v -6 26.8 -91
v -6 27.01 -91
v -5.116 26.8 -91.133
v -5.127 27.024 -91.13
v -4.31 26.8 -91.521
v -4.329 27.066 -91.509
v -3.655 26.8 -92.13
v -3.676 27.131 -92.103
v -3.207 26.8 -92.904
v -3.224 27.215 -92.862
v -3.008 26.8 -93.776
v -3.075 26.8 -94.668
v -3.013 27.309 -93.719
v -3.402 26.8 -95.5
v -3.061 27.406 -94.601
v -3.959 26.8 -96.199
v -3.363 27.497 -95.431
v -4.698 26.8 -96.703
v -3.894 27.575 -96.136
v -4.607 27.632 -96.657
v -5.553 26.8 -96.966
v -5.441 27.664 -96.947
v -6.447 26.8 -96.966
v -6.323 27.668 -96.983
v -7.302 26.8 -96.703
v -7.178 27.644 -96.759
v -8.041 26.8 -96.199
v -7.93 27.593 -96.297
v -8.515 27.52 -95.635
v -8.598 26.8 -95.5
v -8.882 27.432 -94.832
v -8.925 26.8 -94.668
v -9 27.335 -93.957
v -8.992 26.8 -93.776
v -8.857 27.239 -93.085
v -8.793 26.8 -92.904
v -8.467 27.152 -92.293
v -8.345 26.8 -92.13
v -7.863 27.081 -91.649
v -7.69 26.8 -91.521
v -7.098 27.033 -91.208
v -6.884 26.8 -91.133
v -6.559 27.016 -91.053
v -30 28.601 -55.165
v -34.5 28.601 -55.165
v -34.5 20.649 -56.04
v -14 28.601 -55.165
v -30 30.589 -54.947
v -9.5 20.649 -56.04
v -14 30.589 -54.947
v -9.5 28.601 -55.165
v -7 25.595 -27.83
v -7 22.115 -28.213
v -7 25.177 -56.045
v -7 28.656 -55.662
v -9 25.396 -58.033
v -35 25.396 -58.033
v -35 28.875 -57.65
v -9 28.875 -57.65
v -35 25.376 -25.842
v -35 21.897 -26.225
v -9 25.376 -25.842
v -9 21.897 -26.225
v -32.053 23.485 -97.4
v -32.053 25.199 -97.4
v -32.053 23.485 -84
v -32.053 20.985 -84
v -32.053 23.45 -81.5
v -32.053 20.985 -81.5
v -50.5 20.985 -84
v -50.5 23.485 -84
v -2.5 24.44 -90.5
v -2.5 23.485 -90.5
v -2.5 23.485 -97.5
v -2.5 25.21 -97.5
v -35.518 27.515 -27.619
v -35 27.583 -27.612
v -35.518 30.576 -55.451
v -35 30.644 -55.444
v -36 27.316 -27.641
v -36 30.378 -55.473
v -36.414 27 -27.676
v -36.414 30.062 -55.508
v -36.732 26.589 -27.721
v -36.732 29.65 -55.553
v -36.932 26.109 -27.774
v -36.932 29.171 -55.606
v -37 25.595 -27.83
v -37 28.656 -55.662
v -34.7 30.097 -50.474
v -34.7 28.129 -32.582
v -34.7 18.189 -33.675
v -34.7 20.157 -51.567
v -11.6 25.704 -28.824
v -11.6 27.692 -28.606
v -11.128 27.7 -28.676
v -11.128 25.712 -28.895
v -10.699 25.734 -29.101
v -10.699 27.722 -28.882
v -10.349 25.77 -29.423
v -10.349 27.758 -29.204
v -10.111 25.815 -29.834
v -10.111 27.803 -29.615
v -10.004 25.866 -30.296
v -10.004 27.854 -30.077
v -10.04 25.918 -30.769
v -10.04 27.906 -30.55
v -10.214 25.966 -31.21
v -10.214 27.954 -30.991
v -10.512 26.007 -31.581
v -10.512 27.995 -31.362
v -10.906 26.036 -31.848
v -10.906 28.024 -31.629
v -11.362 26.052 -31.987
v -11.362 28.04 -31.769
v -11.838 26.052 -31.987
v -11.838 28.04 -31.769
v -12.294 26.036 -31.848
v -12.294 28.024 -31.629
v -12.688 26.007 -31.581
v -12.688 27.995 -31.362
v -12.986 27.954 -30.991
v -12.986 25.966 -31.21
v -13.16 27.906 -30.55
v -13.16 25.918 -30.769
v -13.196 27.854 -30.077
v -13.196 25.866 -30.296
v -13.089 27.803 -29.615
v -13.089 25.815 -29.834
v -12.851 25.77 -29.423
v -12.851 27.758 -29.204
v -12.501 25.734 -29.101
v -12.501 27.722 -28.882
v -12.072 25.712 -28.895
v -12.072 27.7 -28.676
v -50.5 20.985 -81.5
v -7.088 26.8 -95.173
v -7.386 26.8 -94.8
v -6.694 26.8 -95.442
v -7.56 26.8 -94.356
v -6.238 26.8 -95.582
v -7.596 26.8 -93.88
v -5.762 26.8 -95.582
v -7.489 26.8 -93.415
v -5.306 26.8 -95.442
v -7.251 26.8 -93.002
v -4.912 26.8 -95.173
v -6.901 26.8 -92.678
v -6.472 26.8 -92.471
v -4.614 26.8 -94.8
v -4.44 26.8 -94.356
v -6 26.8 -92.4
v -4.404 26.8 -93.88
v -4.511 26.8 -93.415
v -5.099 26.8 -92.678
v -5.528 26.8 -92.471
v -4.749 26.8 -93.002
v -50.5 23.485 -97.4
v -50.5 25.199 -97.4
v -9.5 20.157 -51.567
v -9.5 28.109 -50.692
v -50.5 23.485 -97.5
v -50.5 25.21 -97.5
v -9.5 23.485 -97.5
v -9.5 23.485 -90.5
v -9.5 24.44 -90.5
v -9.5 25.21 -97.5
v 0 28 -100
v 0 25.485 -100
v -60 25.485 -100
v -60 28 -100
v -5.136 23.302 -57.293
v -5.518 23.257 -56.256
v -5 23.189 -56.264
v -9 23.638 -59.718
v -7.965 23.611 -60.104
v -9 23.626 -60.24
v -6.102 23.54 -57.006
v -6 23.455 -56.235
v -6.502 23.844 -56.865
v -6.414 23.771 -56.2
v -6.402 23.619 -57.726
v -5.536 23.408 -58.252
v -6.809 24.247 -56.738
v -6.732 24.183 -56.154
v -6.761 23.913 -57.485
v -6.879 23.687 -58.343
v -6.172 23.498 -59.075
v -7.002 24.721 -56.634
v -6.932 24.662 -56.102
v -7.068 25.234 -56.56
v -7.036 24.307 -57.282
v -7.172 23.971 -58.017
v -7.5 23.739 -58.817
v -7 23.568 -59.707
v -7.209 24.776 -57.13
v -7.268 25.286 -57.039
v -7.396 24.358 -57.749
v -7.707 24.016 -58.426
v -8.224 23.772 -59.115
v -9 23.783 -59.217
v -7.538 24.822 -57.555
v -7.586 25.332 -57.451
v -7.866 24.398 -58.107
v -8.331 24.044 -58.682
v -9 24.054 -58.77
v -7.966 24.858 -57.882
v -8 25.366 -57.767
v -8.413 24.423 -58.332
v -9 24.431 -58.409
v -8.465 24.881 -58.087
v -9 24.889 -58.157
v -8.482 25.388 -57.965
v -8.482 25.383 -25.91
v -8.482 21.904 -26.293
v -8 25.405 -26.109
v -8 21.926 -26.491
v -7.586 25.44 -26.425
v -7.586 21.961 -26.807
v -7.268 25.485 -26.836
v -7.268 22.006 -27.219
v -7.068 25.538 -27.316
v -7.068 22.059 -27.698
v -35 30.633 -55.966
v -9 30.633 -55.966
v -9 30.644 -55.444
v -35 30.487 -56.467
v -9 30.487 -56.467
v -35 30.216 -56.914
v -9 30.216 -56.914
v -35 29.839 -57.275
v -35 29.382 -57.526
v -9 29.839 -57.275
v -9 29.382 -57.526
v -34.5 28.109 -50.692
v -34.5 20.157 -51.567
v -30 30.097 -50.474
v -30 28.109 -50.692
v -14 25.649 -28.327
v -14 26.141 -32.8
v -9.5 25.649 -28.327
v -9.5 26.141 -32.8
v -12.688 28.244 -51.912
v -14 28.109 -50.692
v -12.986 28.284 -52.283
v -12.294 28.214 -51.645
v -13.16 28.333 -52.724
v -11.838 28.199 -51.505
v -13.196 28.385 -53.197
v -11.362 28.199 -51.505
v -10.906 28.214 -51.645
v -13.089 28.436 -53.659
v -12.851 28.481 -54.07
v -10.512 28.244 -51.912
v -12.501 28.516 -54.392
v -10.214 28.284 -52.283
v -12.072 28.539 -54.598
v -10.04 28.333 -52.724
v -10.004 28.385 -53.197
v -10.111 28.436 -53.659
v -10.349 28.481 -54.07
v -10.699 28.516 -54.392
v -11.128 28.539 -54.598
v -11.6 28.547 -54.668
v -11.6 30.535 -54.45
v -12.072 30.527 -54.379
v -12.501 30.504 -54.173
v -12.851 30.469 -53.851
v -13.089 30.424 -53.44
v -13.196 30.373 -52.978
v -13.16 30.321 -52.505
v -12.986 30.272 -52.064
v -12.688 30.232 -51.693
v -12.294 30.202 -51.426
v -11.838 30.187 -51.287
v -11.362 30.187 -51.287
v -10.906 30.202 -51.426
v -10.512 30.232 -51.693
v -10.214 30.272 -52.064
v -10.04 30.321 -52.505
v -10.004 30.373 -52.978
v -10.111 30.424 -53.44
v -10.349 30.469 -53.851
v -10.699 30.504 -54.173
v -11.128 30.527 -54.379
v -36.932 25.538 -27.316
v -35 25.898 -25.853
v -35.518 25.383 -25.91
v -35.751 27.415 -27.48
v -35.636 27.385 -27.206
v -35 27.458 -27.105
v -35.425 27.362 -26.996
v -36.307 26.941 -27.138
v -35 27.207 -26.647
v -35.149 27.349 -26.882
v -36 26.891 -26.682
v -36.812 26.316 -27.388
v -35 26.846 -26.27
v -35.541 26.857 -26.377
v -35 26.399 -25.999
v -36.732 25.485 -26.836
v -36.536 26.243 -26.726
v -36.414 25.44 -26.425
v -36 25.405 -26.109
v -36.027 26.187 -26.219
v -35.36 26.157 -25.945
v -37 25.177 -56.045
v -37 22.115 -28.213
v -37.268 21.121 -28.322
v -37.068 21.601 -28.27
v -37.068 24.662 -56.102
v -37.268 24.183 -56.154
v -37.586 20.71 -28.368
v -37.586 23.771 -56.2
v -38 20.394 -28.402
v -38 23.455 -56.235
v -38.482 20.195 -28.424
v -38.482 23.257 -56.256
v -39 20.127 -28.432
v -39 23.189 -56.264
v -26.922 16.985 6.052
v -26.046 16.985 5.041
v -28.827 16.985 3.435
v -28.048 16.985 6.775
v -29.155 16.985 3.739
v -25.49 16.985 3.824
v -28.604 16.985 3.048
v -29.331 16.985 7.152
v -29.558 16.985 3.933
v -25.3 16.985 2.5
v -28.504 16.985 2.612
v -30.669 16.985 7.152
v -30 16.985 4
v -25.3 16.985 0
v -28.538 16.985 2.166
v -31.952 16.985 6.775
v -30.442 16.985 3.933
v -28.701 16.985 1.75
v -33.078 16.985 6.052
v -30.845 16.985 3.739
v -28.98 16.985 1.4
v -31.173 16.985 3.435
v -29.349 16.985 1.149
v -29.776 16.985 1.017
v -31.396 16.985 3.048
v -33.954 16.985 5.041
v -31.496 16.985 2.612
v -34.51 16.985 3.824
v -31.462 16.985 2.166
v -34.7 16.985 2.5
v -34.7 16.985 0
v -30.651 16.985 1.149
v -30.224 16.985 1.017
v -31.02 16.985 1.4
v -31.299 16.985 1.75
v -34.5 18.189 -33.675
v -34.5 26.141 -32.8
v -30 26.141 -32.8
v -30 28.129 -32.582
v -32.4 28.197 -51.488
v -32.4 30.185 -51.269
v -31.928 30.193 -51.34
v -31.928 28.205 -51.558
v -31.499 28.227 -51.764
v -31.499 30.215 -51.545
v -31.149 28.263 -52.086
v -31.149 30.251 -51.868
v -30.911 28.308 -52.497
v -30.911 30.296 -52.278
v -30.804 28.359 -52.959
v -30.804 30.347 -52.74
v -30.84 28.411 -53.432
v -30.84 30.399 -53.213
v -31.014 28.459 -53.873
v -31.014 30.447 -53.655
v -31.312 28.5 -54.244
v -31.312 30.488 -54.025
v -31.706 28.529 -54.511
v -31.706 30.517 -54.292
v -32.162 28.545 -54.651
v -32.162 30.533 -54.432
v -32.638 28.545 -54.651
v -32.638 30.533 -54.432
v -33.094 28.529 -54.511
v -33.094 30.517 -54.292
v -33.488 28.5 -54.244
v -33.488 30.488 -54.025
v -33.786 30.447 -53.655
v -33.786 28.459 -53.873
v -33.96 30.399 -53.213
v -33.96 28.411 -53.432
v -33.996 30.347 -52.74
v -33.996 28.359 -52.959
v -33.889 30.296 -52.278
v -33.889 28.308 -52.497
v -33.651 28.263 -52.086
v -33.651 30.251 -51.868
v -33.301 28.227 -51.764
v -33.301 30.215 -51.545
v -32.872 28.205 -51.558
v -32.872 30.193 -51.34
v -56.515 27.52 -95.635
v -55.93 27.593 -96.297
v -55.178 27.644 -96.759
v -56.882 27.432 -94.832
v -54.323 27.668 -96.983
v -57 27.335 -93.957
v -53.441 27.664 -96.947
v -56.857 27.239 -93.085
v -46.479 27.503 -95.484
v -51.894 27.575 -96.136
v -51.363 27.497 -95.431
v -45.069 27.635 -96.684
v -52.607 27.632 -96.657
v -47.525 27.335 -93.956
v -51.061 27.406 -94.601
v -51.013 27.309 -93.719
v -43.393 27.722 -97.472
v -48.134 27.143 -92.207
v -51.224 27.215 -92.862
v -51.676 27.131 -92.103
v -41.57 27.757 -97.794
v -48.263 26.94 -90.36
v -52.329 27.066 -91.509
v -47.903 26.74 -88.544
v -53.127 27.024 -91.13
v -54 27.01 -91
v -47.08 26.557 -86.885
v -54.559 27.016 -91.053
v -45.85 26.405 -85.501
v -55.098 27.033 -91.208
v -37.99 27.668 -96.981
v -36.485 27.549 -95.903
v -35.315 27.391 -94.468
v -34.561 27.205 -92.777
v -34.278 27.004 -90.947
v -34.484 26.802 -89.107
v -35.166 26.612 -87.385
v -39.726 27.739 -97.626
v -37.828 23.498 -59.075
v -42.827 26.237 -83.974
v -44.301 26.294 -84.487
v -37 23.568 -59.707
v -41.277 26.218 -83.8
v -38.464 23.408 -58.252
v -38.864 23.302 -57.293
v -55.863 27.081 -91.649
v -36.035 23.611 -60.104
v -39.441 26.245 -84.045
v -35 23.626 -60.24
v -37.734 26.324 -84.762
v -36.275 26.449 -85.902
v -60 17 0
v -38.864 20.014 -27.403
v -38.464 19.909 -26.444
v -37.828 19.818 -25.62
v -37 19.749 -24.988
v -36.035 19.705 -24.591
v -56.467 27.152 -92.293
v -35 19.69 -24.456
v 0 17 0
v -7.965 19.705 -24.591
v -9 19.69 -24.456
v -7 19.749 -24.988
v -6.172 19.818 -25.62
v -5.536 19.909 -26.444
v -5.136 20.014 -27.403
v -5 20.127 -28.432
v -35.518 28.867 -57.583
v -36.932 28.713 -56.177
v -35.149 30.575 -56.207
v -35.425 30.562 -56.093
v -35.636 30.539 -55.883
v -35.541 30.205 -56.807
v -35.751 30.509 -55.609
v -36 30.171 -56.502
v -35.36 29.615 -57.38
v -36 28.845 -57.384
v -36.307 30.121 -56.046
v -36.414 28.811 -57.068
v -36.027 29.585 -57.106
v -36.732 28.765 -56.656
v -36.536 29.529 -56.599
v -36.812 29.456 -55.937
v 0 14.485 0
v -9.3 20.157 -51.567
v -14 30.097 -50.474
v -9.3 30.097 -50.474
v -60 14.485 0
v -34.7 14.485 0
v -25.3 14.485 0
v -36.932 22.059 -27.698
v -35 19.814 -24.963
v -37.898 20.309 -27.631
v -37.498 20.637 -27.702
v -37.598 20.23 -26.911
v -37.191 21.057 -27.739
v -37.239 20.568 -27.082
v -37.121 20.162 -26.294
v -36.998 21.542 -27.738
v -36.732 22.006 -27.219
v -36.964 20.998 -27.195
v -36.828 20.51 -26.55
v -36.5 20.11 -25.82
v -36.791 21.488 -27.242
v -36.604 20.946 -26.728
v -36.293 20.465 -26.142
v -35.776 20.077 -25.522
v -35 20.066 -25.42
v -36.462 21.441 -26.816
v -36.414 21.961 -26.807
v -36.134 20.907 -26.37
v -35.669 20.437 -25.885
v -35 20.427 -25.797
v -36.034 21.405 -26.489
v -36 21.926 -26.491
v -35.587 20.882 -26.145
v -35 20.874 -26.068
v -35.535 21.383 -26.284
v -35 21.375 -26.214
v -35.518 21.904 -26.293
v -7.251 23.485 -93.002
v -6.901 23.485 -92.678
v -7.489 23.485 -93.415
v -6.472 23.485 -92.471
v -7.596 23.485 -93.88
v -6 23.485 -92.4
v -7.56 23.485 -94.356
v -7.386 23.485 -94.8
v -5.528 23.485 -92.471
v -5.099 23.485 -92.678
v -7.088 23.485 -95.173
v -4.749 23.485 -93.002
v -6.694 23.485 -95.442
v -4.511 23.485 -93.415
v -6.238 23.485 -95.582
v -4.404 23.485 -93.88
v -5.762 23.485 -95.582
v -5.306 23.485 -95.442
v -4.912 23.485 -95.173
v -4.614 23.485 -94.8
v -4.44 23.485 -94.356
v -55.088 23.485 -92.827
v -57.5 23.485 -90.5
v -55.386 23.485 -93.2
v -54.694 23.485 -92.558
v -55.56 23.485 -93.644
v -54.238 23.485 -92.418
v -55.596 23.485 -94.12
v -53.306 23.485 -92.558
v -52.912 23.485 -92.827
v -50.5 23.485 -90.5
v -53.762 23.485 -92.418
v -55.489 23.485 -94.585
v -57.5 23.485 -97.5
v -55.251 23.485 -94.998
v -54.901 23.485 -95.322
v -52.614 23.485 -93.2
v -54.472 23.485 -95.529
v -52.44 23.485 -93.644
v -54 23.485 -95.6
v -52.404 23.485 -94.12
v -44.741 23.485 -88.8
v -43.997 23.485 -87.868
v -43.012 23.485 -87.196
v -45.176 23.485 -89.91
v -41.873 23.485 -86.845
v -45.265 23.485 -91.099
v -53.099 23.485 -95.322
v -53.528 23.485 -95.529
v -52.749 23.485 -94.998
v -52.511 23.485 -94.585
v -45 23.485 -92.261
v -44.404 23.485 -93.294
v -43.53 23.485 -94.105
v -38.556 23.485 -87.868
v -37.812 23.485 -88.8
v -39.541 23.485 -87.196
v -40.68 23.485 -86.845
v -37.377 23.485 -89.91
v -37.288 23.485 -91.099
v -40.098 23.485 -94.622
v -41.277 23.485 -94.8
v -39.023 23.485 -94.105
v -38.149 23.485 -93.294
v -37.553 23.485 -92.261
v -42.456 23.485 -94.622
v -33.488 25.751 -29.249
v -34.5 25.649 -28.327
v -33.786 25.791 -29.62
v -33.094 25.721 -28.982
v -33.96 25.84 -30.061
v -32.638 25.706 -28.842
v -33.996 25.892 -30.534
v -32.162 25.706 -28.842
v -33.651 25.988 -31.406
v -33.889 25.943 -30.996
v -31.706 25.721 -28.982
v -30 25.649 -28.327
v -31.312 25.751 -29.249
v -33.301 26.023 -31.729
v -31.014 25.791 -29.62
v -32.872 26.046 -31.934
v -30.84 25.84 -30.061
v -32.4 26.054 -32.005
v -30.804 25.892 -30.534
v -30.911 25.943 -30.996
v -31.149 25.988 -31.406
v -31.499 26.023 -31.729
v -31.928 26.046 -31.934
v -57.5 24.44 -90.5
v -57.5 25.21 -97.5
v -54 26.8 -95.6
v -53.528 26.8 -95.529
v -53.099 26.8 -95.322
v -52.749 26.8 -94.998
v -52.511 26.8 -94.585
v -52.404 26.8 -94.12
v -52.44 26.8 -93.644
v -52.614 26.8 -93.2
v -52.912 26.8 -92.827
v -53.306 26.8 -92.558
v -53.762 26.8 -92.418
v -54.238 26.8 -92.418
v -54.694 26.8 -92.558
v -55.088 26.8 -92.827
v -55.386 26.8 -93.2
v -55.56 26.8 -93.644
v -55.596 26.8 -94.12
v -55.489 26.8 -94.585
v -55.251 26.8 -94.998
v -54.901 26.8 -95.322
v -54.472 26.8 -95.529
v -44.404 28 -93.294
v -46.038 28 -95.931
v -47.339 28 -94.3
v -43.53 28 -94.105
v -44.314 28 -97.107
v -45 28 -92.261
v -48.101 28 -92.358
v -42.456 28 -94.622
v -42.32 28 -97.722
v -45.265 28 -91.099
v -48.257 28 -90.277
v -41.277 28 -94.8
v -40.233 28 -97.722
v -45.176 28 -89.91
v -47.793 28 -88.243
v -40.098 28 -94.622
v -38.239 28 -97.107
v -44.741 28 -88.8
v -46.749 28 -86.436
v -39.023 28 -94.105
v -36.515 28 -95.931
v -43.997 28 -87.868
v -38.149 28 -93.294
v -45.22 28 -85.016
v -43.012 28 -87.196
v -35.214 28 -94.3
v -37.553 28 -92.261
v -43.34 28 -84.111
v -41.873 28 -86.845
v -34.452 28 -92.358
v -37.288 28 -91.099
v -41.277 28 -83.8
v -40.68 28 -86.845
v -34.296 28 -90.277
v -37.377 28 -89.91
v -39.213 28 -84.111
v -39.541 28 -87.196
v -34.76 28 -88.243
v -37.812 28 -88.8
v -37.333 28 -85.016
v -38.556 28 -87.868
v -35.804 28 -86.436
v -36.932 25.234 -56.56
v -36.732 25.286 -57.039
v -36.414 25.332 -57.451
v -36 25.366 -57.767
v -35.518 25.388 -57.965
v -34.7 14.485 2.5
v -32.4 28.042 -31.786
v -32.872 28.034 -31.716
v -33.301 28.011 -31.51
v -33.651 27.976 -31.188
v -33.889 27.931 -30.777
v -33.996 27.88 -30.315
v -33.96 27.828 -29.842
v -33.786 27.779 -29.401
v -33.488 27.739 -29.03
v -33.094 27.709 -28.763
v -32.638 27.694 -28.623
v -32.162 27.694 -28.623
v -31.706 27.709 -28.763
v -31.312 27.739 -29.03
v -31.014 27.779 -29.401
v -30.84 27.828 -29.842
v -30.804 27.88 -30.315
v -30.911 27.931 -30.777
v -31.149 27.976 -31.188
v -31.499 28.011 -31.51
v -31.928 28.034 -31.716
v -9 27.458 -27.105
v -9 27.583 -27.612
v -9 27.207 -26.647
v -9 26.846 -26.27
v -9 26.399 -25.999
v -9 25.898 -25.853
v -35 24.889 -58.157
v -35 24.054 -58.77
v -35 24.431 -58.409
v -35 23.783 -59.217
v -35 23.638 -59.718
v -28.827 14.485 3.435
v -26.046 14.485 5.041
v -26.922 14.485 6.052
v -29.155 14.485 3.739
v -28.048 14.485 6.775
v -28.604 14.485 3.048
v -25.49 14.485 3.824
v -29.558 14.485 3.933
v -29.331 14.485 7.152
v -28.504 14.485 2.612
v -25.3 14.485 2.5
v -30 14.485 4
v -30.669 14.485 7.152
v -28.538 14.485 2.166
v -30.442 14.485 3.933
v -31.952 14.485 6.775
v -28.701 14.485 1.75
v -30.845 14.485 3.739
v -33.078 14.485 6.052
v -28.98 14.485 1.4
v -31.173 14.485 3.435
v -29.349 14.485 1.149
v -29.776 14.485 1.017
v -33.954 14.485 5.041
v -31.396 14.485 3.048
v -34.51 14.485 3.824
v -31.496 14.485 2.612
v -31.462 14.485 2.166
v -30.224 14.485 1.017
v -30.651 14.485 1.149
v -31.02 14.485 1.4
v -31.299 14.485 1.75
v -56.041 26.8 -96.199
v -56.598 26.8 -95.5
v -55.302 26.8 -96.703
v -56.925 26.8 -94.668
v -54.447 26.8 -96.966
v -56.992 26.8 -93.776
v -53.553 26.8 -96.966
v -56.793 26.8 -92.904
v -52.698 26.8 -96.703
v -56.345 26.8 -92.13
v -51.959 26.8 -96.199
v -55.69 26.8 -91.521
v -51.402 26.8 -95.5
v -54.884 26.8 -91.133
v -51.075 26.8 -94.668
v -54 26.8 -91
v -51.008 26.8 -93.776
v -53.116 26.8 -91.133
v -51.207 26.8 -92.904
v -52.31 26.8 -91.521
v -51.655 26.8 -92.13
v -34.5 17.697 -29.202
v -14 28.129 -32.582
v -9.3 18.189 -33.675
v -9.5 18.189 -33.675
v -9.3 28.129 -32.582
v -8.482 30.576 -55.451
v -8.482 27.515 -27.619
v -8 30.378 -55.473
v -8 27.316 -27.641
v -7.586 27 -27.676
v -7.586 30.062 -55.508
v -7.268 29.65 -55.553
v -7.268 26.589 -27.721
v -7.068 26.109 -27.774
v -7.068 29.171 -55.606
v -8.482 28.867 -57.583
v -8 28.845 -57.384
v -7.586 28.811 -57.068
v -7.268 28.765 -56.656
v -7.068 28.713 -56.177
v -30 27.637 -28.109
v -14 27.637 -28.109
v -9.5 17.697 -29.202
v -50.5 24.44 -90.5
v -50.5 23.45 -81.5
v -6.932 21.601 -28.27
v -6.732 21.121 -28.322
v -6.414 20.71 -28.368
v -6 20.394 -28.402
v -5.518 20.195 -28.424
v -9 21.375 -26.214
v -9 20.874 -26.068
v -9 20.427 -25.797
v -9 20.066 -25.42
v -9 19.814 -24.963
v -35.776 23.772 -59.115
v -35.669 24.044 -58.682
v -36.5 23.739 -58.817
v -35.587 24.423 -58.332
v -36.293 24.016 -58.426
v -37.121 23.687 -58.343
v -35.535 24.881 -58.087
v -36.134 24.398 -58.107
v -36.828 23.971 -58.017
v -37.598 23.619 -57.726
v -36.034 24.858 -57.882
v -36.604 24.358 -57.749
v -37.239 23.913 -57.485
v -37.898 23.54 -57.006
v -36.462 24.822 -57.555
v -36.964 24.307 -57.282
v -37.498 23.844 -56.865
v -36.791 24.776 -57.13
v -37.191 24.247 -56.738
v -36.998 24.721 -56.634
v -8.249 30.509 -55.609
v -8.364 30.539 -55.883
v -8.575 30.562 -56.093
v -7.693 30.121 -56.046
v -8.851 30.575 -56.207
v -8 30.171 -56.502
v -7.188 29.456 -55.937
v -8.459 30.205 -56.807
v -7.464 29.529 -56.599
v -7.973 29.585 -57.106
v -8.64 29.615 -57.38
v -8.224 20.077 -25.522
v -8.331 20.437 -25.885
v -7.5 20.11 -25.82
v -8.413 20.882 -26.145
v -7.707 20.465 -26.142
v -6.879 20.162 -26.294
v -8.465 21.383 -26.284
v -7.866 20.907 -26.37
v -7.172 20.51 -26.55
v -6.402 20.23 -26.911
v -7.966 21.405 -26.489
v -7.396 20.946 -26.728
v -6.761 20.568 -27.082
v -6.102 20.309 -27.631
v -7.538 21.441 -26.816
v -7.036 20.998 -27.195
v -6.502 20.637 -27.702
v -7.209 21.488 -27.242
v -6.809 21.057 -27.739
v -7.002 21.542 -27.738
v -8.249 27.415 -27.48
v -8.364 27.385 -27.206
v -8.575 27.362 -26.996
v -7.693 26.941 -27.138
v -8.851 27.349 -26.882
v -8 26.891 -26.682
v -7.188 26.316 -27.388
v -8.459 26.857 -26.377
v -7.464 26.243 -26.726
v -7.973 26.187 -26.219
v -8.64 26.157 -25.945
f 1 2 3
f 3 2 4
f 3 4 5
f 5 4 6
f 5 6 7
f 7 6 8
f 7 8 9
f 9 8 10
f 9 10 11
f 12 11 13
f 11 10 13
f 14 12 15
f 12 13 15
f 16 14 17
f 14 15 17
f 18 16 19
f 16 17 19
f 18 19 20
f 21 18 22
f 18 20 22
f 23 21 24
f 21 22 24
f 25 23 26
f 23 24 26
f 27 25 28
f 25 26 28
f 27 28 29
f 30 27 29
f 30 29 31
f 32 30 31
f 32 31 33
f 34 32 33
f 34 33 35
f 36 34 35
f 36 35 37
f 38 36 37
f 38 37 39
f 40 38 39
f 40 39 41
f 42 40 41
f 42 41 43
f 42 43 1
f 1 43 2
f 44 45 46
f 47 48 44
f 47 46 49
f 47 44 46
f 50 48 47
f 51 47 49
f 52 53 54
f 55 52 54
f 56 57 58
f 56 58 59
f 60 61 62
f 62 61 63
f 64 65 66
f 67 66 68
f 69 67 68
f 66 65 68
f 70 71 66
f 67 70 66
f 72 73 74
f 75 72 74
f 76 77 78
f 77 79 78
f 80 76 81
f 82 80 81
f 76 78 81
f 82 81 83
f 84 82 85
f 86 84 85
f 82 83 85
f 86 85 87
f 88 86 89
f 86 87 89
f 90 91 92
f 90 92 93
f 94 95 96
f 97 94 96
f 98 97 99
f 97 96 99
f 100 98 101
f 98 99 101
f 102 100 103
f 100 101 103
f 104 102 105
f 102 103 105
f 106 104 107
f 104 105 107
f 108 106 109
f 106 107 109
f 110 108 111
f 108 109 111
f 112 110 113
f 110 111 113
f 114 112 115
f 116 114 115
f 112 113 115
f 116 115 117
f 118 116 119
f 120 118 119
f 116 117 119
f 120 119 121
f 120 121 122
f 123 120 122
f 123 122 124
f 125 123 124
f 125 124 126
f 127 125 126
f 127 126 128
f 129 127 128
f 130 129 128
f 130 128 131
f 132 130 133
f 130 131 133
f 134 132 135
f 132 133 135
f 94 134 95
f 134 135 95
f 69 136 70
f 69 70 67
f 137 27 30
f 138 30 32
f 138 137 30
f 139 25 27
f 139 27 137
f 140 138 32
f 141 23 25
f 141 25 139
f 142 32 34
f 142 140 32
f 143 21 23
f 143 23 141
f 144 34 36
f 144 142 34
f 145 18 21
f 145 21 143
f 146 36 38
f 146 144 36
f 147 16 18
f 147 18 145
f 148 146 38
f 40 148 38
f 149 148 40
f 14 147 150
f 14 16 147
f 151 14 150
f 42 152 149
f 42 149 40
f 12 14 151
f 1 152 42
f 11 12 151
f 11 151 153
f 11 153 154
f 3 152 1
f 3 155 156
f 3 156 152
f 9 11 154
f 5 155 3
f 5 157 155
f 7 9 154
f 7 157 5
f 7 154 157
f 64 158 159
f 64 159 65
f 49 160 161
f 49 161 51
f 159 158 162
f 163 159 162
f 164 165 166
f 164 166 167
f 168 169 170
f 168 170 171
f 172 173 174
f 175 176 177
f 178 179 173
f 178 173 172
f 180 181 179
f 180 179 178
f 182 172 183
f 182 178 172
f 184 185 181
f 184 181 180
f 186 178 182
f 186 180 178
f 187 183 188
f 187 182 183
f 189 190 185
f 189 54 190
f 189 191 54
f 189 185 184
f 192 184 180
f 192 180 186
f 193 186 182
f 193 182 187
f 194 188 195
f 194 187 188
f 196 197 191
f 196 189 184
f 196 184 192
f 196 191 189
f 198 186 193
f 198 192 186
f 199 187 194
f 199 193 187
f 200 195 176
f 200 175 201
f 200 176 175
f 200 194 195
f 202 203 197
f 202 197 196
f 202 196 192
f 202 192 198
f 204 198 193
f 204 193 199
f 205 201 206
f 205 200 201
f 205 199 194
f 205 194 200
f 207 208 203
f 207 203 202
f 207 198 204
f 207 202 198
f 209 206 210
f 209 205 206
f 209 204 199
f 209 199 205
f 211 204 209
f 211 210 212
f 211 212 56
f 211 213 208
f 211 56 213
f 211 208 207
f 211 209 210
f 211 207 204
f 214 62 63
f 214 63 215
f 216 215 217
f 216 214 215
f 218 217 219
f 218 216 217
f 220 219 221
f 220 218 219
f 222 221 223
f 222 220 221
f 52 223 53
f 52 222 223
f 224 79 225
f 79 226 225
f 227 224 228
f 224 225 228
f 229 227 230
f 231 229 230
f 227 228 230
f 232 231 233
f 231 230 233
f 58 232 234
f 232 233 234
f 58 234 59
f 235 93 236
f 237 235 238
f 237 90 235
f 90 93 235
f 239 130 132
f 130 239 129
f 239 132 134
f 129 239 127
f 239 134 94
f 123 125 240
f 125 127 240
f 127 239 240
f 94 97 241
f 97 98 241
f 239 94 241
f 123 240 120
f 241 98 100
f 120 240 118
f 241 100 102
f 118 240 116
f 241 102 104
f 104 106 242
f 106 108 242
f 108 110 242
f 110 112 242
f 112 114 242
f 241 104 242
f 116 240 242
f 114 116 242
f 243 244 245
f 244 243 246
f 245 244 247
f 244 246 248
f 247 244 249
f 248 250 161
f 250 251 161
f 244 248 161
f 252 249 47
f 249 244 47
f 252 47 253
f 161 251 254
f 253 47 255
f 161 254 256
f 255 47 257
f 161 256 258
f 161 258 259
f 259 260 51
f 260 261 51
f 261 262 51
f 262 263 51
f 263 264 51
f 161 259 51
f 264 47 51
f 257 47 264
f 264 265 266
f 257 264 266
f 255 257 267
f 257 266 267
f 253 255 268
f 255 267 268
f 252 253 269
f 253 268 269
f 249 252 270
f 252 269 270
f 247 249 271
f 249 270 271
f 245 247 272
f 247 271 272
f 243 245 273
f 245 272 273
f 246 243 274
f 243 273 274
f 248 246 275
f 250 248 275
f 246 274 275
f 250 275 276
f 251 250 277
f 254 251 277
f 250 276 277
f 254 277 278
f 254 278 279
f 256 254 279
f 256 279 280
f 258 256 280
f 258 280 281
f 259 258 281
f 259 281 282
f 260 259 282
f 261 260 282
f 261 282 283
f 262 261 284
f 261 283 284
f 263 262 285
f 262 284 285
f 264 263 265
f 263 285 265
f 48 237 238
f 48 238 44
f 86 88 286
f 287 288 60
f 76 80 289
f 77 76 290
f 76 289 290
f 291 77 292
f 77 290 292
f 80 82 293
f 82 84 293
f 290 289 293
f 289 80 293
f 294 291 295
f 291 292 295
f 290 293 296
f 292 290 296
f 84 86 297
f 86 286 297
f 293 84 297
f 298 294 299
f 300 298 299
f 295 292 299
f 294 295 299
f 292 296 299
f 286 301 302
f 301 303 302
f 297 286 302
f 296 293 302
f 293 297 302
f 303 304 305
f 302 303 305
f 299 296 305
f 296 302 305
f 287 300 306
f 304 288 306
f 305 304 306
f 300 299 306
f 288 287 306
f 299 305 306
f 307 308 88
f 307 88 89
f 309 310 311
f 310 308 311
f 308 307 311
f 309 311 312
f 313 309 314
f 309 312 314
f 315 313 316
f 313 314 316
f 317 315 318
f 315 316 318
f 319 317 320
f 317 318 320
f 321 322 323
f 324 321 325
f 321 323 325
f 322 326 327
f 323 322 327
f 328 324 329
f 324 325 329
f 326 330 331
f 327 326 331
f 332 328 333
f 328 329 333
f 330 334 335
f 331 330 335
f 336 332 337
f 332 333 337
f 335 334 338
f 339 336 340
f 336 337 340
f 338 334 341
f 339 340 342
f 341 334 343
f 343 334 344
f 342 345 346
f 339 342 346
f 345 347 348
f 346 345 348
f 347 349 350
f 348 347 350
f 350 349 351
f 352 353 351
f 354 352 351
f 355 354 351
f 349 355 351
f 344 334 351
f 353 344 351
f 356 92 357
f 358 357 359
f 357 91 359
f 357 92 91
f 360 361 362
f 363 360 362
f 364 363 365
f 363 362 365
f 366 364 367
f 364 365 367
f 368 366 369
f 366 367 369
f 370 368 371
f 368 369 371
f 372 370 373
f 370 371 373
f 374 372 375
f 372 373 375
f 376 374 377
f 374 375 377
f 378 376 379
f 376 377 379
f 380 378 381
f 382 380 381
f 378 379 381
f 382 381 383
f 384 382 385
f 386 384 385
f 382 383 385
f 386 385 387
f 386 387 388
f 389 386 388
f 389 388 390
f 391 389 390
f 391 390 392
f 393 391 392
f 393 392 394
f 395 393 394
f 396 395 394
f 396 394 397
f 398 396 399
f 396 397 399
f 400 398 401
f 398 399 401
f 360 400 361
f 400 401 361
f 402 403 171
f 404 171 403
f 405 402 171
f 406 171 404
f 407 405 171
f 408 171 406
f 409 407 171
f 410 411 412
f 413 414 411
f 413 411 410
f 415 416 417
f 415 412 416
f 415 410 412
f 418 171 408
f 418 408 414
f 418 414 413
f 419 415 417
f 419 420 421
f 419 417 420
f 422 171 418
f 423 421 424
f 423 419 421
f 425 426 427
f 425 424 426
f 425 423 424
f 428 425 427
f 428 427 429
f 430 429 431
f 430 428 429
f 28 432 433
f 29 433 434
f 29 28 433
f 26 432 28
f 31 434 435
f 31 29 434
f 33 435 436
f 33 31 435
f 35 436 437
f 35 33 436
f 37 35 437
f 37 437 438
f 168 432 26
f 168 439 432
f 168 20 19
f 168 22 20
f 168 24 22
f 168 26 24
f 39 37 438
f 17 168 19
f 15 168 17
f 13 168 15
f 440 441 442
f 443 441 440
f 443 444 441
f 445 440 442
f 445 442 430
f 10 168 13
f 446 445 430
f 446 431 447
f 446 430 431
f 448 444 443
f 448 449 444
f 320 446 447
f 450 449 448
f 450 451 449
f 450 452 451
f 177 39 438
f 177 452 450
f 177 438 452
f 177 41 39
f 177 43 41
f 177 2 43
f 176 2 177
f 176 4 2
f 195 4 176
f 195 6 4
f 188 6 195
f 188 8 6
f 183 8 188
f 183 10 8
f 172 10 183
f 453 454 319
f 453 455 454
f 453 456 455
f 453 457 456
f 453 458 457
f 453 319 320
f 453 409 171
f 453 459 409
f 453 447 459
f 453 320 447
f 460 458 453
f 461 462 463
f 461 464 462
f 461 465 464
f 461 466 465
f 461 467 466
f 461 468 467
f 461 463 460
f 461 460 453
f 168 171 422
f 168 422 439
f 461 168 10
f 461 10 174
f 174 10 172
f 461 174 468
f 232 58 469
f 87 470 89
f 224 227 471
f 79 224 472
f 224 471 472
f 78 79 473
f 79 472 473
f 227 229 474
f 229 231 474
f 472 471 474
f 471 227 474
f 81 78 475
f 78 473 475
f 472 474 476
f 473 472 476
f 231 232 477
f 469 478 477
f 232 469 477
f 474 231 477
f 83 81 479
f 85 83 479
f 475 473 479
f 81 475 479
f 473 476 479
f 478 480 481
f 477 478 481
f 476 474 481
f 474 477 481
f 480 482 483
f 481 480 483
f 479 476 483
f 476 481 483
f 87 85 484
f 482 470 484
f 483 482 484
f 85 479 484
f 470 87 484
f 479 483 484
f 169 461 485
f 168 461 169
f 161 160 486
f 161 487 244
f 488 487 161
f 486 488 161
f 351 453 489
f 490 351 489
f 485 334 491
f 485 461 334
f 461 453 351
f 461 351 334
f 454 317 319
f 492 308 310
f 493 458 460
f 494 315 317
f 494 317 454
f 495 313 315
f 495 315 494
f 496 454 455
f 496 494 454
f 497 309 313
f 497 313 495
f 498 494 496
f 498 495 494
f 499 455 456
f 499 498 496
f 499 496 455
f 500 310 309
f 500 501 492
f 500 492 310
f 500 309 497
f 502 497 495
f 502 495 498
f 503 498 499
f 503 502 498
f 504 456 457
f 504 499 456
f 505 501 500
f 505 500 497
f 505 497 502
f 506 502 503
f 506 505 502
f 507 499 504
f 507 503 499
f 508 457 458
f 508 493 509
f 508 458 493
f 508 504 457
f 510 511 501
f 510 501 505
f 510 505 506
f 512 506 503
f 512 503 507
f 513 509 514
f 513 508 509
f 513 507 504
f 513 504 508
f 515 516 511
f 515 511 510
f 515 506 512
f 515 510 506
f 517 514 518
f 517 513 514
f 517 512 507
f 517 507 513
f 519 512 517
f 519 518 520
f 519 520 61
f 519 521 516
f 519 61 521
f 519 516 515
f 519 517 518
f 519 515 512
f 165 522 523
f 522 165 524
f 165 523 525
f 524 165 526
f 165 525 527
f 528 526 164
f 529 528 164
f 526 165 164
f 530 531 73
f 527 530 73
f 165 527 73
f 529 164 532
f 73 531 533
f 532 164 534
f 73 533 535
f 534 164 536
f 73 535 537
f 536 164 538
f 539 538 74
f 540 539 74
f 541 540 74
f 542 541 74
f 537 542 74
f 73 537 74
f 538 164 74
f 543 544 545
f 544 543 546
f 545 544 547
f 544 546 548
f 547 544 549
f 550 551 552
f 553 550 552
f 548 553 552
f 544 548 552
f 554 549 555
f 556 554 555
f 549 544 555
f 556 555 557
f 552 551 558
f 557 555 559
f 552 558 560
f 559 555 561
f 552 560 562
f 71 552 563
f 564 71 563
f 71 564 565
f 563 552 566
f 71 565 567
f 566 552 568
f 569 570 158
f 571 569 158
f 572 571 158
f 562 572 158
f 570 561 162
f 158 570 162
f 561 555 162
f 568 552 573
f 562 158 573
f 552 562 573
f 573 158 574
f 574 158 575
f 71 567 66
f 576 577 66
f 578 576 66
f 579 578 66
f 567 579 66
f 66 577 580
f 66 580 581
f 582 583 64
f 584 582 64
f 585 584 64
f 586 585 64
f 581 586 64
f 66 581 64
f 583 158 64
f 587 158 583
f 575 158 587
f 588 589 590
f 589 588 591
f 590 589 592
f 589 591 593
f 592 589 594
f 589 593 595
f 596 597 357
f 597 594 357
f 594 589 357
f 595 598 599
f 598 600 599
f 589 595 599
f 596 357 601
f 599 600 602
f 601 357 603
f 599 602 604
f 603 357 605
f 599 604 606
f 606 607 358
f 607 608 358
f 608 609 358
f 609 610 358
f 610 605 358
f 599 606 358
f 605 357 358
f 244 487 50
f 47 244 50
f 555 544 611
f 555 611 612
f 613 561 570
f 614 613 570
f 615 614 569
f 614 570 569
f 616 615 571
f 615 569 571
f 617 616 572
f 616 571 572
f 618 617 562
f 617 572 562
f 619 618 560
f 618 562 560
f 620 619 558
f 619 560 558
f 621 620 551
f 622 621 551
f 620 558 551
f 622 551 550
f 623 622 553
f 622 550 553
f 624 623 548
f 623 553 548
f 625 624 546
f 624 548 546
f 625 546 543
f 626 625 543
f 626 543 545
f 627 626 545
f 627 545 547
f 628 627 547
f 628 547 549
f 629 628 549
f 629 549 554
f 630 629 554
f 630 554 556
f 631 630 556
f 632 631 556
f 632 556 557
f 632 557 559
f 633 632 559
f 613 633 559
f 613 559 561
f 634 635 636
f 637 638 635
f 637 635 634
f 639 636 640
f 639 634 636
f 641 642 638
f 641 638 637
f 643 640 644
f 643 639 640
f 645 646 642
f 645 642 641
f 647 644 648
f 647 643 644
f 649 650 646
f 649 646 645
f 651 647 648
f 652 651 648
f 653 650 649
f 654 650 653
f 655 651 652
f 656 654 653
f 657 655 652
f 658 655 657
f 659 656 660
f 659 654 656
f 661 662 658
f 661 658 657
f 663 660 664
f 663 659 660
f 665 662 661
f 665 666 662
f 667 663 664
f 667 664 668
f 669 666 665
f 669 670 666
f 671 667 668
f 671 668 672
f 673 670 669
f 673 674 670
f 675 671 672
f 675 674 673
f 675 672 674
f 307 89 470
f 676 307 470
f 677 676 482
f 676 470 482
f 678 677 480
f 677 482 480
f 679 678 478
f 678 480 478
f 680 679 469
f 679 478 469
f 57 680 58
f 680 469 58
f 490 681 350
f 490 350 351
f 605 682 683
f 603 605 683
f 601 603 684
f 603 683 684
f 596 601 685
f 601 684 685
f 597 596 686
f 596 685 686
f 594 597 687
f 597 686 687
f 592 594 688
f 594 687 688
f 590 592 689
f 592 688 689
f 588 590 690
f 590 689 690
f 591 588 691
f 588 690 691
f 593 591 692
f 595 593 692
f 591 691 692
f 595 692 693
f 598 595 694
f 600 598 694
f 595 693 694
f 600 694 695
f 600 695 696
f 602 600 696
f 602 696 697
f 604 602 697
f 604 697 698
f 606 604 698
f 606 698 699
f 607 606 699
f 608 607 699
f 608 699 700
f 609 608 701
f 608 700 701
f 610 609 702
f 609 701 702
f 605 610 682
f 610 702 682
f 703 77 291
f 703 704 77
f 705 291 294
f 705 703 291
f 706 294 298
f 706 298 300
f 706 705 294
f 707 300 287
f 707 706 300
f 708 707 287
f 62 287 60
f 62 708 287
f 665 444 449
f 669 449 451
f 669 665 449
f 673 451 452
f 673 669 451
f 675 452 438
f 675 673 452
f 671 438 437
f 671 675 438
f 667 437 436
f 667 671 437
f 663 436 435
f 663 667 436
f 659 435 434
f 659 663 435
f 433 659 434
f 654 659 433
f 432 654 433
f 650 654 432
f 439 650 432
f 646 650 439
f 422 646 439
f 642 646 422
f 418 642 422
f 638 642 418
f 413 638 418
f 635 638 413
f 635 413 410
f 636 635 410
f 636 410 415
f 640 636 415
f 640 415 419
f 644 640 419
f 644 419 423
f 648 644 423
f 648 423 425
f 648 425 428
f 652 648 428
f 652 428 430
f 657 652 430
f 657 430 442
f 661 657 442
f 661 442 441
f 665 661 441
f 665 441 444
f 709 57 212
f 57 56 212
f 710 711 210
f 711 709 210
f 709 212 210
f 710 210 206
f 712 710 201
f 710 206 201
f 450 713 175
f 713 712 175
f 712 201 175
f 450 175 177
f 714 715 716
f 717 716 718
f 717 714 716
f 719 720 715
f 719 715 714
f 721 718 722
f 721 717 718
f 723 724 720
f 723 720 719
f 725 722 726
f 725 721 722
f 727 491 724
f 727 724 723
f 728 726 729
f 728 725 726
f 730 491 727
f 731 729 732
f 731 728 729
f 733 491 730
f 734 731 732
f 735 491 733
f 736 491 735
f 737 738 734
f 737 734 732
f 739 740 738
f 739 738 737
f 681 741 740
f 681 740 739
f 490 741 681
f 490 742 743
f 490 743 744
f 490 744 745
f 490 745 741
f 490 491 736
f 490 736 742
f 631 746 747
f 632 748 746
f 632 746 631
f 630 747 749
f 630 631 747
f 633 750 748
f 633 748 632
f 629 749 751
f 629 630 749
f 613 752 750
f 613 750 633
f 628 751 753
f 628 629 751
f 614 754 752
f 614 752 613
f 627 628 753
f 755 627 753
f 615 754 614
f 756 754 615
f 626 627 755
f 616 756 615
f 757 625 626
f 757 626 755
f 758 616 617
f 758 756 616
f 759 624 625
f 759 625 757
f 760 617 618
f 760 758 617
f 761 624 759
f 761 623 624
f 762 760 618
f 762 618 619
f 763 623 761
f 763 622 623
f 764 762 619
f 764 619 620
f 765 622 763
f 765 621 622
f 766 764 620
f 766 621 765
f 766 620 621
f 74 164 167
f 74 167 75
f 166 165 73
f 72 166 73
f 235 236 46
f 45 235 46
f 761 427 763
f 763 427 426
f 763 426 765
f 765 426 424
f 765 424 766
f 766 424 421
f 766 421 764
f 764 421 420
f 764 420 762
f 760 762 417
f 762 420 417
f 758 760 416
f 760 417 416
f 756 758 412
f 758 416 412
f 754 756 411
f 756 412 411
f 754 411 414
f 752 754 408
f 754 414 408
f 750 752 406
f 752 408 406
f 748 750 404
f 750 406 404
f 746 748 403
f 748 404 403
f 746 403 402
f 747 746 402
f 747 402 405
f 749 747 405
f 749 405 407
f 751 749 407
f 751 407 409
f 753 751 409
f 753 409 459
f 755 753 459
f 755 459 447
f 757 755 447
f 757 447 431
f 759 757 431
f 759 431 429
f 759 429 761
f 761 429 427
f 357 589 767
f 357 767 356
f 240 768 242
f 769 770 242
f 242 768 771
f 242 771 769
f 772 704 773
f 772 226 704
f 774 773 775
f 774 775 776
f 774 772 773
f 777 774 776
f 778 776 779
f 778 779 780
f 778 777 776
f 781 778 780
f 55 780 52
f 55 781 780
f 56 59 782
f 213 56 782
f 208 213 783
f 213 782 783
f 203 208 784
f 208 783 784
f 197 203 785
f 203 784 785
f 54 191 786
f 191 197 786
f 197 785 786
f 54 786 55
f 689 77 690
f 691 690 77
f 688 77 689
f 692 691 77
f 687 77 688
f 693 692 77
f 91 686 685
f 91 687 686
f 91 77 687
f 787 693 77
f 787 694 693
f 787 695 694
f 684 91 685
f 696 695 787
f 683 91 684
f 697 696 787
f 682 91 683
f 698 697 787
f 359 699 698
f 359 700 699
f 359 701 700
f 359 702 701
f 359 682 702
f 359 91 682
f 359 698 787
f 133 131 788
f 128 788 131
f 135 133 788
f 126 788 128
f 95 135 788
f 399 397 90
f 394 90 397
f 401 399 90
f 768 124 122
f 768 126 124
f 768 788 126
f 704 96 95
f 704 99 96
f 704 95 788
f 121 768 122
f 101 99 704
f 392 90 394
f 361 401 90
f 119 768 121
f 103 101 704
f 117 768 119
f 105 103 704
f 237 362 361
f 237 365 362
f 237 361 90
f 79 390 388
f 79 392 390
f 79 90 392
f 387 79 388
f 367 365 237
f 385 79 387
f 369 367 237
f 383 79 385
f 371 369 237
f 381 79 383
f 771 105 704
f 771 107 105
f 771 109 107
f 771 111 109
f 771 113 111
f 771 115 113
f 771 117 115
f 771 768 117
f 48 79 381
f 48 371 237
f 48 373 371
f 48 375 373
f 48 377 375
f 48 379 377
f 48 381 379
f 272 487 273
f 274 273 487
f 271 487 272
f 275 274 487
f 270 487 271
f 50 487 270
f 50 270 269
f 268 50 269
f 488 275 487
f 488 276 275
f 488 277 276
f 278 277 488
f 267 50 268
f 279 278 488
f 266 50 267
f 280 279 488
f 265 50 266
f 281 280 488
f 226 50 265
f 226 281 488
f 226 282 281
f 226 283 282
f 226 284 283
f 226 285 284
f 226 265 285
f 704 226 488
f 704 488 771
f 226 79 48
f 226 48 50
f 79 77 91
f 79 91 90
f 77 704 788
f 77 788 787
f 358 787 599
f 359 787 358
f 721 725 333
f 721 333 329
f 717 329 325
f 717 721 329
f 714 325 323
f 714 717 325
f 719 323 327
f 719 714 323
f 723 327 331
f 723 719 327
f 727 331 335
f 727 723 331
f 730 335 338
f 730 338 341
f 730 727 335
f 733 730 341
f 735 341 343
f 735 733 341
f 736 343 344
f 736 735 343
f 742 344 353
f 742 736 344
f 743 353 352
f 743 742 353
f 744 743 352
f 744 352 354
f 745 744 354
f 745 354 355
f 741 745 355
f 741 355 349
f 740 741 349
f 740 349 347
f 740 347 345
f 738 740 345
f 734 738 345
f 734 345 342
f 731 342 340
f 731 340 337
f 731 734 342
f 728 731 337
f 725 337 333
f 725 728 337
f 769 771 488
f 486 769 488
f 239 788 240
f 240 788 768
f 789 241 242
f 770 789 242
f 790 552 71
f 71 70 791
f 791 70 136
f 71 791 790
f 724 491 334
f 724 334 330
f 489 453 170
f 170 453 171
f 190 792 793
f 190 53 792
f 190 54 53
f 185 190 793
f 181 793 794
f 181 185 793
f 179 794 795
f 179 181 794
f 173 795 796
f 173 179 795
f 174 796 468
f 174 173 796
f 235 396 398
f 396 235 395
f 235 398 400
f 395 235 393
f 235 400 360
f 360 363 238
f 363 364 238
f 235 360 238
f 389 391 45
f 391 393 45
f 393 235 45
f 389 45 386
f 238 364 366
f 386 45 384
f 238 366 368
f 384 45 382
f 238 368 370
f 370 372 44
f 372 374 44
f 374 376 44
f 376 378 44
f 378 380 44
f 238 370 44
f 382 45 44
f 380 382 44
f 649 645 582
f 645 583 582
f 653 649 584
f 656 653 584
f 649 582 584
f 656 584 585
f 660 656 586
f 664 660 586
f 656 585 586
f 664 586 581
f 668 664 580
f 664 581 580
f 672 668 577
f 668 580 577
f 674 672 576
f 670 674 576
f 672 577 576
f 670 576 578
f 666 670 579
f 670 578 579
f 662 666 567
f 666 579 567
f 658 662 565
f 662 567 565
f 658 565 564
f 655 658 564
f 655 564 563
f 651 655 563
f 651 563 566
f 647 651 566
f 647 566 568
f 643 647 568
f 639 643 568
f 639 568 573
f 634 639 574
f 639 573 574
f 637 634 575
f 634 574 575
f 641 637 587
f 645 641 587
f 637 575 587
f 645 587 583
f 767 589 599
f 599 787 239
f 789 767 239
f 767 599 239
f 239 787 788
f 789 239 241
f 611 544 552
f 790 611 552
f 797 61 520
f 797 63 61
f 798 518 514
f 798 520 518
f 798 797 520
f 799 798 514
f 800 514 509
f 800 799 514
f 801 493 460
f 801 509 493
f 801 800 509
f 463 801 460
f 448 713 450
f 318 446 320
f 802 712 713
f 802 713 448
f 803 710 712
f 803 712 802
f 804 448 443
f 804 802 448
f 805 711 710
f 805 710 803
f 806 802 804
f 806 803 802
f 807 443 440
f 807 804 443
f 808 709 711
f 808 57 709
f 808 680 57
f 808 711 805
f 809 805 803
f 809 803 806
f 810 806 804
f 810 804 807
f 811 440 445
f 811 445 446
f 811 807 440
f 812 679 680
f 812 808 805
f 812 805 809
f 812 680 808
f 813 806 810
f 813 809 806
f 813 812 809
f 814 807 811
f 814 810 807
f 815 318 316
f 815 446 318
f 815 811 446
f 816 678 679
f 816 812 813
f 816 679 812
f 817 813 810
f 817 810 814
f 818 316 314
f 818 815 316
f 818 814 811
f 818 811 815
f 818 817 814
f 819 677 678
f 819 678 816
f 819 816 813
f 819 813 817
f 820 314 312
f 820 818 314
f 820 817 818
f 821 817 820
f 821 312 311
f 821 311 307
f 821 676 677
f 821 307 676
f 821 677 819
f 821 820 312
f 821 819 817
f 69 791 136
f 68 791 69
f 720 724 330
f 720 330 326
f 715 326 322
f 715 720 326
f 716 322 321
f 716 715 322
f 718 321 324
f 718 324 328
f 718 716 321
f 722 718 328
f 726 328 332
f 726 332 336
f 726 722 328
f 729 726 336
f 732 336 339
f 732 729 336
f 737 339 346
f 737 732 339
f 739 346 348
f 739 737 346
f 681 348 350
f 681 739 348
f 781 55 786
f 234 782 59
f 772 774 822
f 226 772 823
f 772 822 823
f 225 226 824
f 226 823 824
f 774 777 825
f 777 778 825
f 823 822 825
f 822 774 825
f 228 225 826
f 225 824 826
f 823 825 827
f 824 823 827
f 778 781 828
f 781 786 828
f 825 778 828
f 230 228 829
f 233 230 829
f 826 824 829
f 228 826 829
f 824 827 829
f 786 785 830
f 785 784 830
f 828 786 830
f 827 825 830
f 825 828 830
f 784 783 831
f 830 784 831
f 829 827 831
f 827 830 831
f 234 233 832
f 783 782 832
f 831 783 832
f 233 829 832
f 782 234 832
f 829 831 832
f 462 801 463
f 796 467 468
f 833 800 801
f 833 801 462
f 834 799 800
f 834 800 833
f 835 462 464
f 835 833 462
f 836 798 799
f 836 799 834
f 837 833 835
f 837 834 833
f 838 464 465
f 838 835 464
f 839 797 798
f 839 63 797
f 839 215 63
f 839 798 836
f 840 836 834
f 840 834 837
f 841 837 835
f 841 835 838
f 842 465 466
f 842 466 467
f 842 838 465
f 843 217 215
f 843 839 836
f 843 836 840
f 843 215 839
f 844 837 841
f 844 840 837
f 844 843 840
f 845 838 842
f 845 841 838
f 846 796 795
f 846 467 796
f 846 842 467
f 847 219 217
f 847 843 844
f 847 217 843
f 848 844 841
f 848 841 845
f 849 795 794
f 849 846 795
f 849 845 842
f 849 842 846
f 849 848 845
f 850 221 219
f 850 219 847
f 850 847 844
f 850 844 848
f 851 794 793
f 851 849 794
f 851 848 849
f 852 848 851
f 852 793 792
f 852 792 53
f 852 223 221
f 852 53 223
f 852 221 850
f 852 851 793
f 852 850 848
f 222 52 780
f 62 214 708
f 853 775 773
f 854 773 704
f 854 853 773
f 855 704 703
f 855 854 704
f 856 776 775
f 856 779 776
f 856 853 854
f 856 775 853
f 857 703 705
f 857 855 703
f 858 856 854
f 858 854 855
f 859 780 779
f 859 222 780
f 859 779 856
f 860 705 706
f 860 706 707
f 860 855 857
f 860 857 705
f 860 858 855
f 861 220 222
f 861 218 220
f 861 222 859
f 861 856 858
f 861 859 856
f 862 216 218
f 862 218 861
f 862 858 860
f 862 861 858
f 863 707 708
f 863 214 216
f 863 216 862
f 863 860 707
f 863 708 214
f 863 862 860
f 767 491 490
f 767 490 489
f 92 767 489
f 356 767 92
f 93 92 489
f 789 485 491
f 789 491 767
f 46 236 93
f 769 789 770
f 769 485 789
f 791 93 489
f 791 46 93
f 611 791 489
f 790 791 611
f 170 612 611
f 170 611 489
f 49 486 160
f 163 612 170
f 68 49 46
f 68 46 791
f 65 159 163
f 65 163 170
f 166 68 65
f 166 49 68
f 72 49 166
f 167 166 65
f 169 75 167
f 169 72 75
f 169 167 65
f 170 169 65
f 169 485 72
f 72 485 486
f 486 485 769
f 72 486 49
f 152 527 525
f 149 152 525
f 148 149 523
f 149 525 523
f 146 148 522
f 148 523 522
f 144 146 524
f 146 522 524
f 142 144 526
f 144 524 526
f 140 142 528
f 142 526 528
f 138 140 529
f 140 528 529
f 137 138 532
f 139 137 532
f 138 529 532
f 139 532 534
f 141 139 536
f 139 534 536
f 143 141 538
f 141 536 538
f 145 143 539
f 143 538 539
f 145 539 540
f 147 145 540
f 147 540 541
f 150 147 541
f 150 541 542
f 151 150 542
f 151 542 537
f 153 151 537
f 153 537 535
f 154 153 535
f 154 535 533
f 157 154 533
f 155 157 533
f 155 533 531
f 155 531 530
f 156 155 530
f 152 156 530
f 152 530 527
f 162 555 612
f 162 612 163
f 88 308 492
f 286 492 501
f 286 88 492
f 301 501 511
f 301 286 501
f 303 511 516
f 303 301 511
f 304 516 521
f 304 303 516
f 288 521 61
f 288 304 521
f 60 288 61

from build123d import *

# Parameters (mm, degrees)
EXTRUDE_1_DEPTH             = 60
EXTRUDE_2_REACH             = 118.966
SKETCH_3_W                  = 7
SKETCH_3_H                  = 7
SKETCH_4_R                  = 1.6
CUT_EXTRUDE_1_DEPTH         = 117.965806969
SKETCH_5_R                  = 3
CUT_EXTRUDE_2_DEPTH         = 1.2
EXTRUDE_3_REACH             = 118.966
SKETCH_6_W                  = 18.446856435
SKETCH_6_H                  = 14
SKETCH_7_W                  = 18.446856435
SKETCH_7_H                  = 2.5
EXTRUDE_4_DEPTH             = 2.5
EXTRUDE_4_DIRECTION_2_REACH = 118.966
SKETCH_8_R                  = 4
CUT_EXTRUDE_3_DEPTH         = 117.965806969
EXTRUDE_5_REACH             = 119.4
SKETCH_9_R                  = 7
SKETCH_11_R                 = 4
CUT_EXTRUDE_5_DEPTH         = 117.965806969
SKETCH_12_W                 = 30
SKETCH_12_H                 = 32
EXTRUDE_6_DEPTH             = 7.5
SKETCH_13_W                 = 25
SKETCH_13_H                 = 27
CUT_EXTRUDE_6_DEPTH         = 120.314910243
SKETCH_14_W                 = 4.5
SKETCH_14_H                 = 4.5
SKETCH_14_R                 = 1.6
EXTRUDE_7_DEPTH             = 2
FILLET_2_R                  = 2
SKETCH_15_W                 = 25.4
SKETCH_15_H                 = 18
CUT_EXTRUDE_7_DEPTH         = 120.314910243
SKETCH_16_R                 = 1.5
EXTRUDE_8_DEPTH             = 2.5


with BuildPart() as part:
    # 草图2 → 凸台-拉伸1 (new body)
    with BuildSketch(Plane(origin=(0, 0, 0), x_dir=(0, 0, -1), z_dir=(1, 0, 0))):
        Polygon((100, 28), (0, 17), (0, 14.484920478), (100, 25.484920478), align=None)
    extrude(amount=-EXTRUDE_1_DEPTH)

    # 凸台-拉伸2: up to this plane
    extrude_2_end = Plane(origin=(-60, 14.484920478, 0), z_dir=(0, -0.9940043559354329, -0.10934047915289775))
    # 草图3 → 凸台-拉伸2 (add, up to the surface)
    with BuildSketch(Plane(origin=(0, 23.484920478, 0), x_dir=(1, 0, 0), z_dir=(0, 1, 0)), mode=Mode.PRIVATE) as extrude_2_sk1:
        with Locations((-54, 94)):
            Rectangle(SKETCH_3_W, SKETCH_3_H)
    extrude_2_tool1 = split(extrude(extrude_2_sk1.sketch, amount=EXTRUDE_2_REACH, mode=Mode.PRIVATE), bisect_by=extrude_2_end, keep=Keep.BOTH, mode=Mode.PRIVATE)
    add(extrude_2_tool1.solids().sort_by_distance((-54, 23.48492, -94))[0])
    # 草图3 → 凸台-拉伸2 (add, up to the surface)
    with BuildSketch(Plane(origin=(0, 23.484920478, 0), x_dir=(1, 0, 0), z_dir=(0, 1, 0)), mode=Mode.PRIVATE) as extrude_2_sk2:
        with Locations((-6, 94)):
            Rectangle(SKETCH_3_W, SKETCH_3_H)
    extrude_2_tool2 = split(extrude(extrude_2_sk2.sketch, amount=EXTRUDE_2_REACH, mode=Mode.PRIVATE), bisect_by=extrude_2_end, keep=Keep.BOTH, mode=Mode.PRIVATE)
    add(extrude_2_tool2.solids().sort_by_distance((-6, 23.48492, -94))[0])

    # 草图4 → 切除-拉伸1 (cut, through all)
    with BuildSketch(Plane.XZ.offset(-23.484920478)):
        with Locations(Location((-54, -94, 0), (0, 0, 270))):
            Circle(SKETCH_4_R)
        with Locations(Location((-6, -94, 0), (0, 0, 90))):
            Circle(SKETCH_4_R)
    extrude(amount=-CUT_EXTRUDE_1_DEPTH, mode=Mode.SUBTRACT)

    # 草图5 → 切除-拉伸2 (cut)
    with BuildSketch(Plane(origin=(0, 28, 0), x_dir=(1, 0, 0), z_dir=(0, 1, 0))):
        with Locations(Location((-54, 94, 0), (0, 0, 270))):
            Circle(SKETCH_5_R)
        with Locations(Location((-6, 94, 0), (0, 0, 270))):
            Circle(SKETCH_5_R)
    extrude(amount=-CUT_EXTRUDE_2_DEPTH, mode=Mode.SUBTRACT)

    # 凸台-拉伸3: up to this plane
    extrude_3_end = Plane(origin=(-60, 14.484920478, 0), z_dir=(0, -0.9940043559354329, -0.10934047915289775))
    # 草图6 → 凸台-拉伸3 (add, up to the surface)
    with BuildSketch(Plane(origin=(0, 23.484920478, 0), x_dir=(1, 0, 0), z_dir=(0, 1, 0)), mode=Mode.PRIVATE) as extrude_3_sk1:
        with Locations((-41.276571782, 90.4)):
            Rectangle(SKETCH_6_W, SKETCH_6_H)
    extrude_3_tool1 = split(extrude(extrude_3_sk1.sketch, amount=EXTRUDE_3_REACH, mode=Mode.PRIVATE), bisect_by=extrude_3_end, keep=Keep.BOTH, mode=Mode.PRIVATE)
    add(extrude_3_tool1.solids().sort_by_distance((-41.276572, 23.48492, -90.4))[0])

    # 草图7 → 凸台-拉伸4 (add)
    with BuildSketch(Plane.XZ.offset(-23.484920478)):
        with Locations((-41.276571782, -82.75)):
            Rectangle(SKETCH_7_W, SKETCH_7_H)
    extrude(amount=EXTRUDE_4_DEPTH)

    # 草图7 → 凸台-拉伸4 direction 2 (add, up to next)
    with BuildSketch(Plane.XZ.offset(-23.484920478), mode=Mode.PRIVATE) as extrude_4_direction_2_sk1:
        with Locations((-41.276571782, -82.75)):
            Rectangle(SKETCH_7_W, SKETCH_7_H)
    extrude_4_direction_2_tool1 = extrude(extrude_4_direction_2_sk1.sketch, amount=-EXTRUDE_4_DIRECTION_2_REACH, mode=Mode.PRIVATE) - part.part
    add(extrude_4_direction_2_tool1.solids().sort_by_distance((-41.276572, 23.48492, -82.75))[0])

    # 草图8 → 切除-拉伸3 (cut, through all)
    with BuildSketch(Plane.XZ.offset(-23.484920478)):
        with Locations(Location((-41.276571782, -90.8, 0), (0, 0, 270))):
            Circle(SKETCH_8_R)
    extrude(amount=-CUT_EXTRUDE_3_DEPTH, mode=Mode.SUBTRACT)

    # 凸台-拉伸5: up to this plane
    extrude_5_end = Plane(origin=(-60, 28, -100), z_dir=(0, 0.9940043559354329, 0.10934047915289762))
    # 草图9 → 凸台-拉伸5 (add, up to the surface)
    with BuildSketch(Plane(origin=(0, 28, 0), x_dir=(1, 0, 0), z_dir=(0, 1, 0)), mode=Mode.PRIVATE) as extrude_5_sk1:
        with Locations(Location((-41.276571782, 90.8, 0), (0, 0, 270))):
            Circle(SKETCH_9_R)
    extrude_5_tool1 = split(extrude(extrude_5_sk1.sketch, amount=-EXTRUDE_5_REACH, mode=Mode.PRIVATE), bisect_by=extrude_5_end, keep=Keep.BOTH, mode=Mode.PRIVATE)
    add(extrude_5_tool1.solids().sort_by_distance((-41.276572, 28, -90.8))[0])

    # 草图11 → 切除-拉伸5 (cut, through all)
    with BuildSketch(Plane.XZ.offset(-23.484920478)):
        with Locations(Location((-41.276571782, -90.8, 0), (0, 0, 270))):
            Circle(SKETCH_11_R)
    extrude(amount=-CUT_EXTRUDE_5_DEPTH, mode=Mode.SUBTRACT)

    # 草图12 → 凸台-拉伸6 (add)
    with BuildSketch(Plane(origin=(0, 16.796759214, 1.847643513), x_dir=(1, 0, 0), z_dir=(0, 0.994004355935433, 0.10934047915289764))):
        with Locations((-22, 44.46196901)):
            Rectangle(SKETCH_12_W, SKETCH_12_H)
    extrude(amount=EXTRUDE_6_DEPTH)

    # 草图13 → 切除-拉伸6 (cut, through all)
    with BuildSketch(Plane(origin=(0, 24.251791883, 2.667697107), x_dir=(1, 0, 0), z_dir=(0, 0.994004355935433, 0.10934047915289753))):
        with Locations((-22, 44.46196901)):
            Rectangle(SKETCH_13_W, SKETCH_13_H)
    extrude(amount=-CUT_EXTRUDE_6_DEPTH, mode=Mode.SUBTRACT)

    # 草图14 → 凸台-拉伸7 (add)
    # profile 1 of 4: a face of its own
    with BuildSketch(Plane(origin=(0, 24.251791883, 2.667697107), x_dir=(1, 0, 0), z_dir=(0, 0.994004355935433, 0.10934047915289753))):
        with Locations((-32.25, 55.71196901)):
            Rectangle(SKETCH_14_W, SKETCH_14_H)
        with Locations(Location((-32.4, 55.86196901, 0), (0, 0, 270))):
            Circle(SKETCH_14_R, mode=Mode.SUBTRACT)
    # profile 2 of 4: a face of its own
    with BuildSketch(Plane(origin=(0, 24.251791883, 2.667697107), x_dir=(1, 0, 0), z_dir=(0, 0.994004355935433, 0.10934047915289753))):
        with Locations((-32.25, 33.21196901)):
            Rectangle(SKETCH_14_W, SKETCH_14_H)
        with Locations(Location((-32.4, 33.06196901, 0), (0, 0, 90))):
            Circle(SKETCH_14_R, mode=Mode.SUBTRACT)
    # profile 3 of 4: a face of its own
    with BuildSketch(Plane(origin=(0, 24.251791883, 2.667697107), x_dir=(1, 0, 0), z_dir=(0, 0.994004355935433, 0.10934047915289753))):
        with Locations((-11.75, 33.21196901)):
            Rectangle(SKETCH_14_W, SKETCH_14_H)
        with Locations(Location((-11.6, 33.06196901, 0), (0, 0, 270))):
            Circle(SKETCH_14_R, mode=Mode.SUBTRACT)
    # profile 4 of 4: a face of its own
    with BuildSketch(Plane(origin=(0, 24.251791883, 2.667697107), x_dir=(1, 0, 0), z_dir=(0, 0.994004355935433, 0.10934047915289753))):
        with Locations((-11.75, 55.71196901)):
            Rectangle(SKETCH_14_W, SKETCH_14_H)
        with Locations(Location((-11.6, 55.86196901, 0), (0, 0, 90))):
            Circle(SKETCH_14_R, mode=Mode.SUBTRACT)
    extrude(amount=-EXTRUDE_7_DEPTH)

    # 圆角2
    fillet_2_edges = [part.edges().sort_by_distance(p)[0] for p in [
        (-7, 21.658252209, -42.347747356),
        (-7, 23.636320877, -26.033650864),
        (-22, 23.407699876, -58.251817051),
        (-7, 27.13521621, -57.841790254),
        (-37, 21.658252209, -42.347747356),
        (-37, 27.13521621, -57.841790254),
        (-22, 19.908804543, -26.443677661),
        (-37, 23.636320877, -26.033650864),
        (-7, 29.113284879, -41.527693762),
        (-22, 30.862732545, -57.431763457),
        (-37, 29.113284879, -41.527693762),
        (-22, 27.363837212, -25.623624067),
    ]]
    fillet(fillet_2_edges, radius=FILLET_2_R)

    # 草图15 → 切除-拉伸7 (cut, through all)
    with BuildSketch(Plane(origin=(0, 24.251791883, 2.667697107), x_dir=(1, 0, 0), z_dir=(0, 0.994004355935433, 0.10934047915289753))):
        with Locations((-22, 44.46196901)):
            Rectangle(SKETCH_15_W, SKETCH_15_H)
    extrude(amount=-CUT_EXTRUDE_7_DEPTH, mode=Mode.SUBTRACT)

    # 草图16 → 凸台-拉伸8 (add)
    with BuildSketch(Plane(origin=(0, 14.484920478, 0), x_dir=(1, 0, 0), z_dir=(0, 1, 0))):
        with BuildLine():
            Line((-34.7, -2.5), (-34.7, 0))
            Line((-34.7, 0), (-25.3, 0))
            Line((-25.3, 0), (-25.3, -2.5))
            ThreePointArc((-25.3, -2.5), (-30, -7.2), (-34.7, -2.5))
        make_face()
        with Locations(Location((-30, -2.5, 0), (0, 0, 270))):
            Circle(SKETCH_16_R, mode=Mode.SUBTRACT)
    extrude(amount=EXTRUDE_8_DEPTH)


solid = part.part
